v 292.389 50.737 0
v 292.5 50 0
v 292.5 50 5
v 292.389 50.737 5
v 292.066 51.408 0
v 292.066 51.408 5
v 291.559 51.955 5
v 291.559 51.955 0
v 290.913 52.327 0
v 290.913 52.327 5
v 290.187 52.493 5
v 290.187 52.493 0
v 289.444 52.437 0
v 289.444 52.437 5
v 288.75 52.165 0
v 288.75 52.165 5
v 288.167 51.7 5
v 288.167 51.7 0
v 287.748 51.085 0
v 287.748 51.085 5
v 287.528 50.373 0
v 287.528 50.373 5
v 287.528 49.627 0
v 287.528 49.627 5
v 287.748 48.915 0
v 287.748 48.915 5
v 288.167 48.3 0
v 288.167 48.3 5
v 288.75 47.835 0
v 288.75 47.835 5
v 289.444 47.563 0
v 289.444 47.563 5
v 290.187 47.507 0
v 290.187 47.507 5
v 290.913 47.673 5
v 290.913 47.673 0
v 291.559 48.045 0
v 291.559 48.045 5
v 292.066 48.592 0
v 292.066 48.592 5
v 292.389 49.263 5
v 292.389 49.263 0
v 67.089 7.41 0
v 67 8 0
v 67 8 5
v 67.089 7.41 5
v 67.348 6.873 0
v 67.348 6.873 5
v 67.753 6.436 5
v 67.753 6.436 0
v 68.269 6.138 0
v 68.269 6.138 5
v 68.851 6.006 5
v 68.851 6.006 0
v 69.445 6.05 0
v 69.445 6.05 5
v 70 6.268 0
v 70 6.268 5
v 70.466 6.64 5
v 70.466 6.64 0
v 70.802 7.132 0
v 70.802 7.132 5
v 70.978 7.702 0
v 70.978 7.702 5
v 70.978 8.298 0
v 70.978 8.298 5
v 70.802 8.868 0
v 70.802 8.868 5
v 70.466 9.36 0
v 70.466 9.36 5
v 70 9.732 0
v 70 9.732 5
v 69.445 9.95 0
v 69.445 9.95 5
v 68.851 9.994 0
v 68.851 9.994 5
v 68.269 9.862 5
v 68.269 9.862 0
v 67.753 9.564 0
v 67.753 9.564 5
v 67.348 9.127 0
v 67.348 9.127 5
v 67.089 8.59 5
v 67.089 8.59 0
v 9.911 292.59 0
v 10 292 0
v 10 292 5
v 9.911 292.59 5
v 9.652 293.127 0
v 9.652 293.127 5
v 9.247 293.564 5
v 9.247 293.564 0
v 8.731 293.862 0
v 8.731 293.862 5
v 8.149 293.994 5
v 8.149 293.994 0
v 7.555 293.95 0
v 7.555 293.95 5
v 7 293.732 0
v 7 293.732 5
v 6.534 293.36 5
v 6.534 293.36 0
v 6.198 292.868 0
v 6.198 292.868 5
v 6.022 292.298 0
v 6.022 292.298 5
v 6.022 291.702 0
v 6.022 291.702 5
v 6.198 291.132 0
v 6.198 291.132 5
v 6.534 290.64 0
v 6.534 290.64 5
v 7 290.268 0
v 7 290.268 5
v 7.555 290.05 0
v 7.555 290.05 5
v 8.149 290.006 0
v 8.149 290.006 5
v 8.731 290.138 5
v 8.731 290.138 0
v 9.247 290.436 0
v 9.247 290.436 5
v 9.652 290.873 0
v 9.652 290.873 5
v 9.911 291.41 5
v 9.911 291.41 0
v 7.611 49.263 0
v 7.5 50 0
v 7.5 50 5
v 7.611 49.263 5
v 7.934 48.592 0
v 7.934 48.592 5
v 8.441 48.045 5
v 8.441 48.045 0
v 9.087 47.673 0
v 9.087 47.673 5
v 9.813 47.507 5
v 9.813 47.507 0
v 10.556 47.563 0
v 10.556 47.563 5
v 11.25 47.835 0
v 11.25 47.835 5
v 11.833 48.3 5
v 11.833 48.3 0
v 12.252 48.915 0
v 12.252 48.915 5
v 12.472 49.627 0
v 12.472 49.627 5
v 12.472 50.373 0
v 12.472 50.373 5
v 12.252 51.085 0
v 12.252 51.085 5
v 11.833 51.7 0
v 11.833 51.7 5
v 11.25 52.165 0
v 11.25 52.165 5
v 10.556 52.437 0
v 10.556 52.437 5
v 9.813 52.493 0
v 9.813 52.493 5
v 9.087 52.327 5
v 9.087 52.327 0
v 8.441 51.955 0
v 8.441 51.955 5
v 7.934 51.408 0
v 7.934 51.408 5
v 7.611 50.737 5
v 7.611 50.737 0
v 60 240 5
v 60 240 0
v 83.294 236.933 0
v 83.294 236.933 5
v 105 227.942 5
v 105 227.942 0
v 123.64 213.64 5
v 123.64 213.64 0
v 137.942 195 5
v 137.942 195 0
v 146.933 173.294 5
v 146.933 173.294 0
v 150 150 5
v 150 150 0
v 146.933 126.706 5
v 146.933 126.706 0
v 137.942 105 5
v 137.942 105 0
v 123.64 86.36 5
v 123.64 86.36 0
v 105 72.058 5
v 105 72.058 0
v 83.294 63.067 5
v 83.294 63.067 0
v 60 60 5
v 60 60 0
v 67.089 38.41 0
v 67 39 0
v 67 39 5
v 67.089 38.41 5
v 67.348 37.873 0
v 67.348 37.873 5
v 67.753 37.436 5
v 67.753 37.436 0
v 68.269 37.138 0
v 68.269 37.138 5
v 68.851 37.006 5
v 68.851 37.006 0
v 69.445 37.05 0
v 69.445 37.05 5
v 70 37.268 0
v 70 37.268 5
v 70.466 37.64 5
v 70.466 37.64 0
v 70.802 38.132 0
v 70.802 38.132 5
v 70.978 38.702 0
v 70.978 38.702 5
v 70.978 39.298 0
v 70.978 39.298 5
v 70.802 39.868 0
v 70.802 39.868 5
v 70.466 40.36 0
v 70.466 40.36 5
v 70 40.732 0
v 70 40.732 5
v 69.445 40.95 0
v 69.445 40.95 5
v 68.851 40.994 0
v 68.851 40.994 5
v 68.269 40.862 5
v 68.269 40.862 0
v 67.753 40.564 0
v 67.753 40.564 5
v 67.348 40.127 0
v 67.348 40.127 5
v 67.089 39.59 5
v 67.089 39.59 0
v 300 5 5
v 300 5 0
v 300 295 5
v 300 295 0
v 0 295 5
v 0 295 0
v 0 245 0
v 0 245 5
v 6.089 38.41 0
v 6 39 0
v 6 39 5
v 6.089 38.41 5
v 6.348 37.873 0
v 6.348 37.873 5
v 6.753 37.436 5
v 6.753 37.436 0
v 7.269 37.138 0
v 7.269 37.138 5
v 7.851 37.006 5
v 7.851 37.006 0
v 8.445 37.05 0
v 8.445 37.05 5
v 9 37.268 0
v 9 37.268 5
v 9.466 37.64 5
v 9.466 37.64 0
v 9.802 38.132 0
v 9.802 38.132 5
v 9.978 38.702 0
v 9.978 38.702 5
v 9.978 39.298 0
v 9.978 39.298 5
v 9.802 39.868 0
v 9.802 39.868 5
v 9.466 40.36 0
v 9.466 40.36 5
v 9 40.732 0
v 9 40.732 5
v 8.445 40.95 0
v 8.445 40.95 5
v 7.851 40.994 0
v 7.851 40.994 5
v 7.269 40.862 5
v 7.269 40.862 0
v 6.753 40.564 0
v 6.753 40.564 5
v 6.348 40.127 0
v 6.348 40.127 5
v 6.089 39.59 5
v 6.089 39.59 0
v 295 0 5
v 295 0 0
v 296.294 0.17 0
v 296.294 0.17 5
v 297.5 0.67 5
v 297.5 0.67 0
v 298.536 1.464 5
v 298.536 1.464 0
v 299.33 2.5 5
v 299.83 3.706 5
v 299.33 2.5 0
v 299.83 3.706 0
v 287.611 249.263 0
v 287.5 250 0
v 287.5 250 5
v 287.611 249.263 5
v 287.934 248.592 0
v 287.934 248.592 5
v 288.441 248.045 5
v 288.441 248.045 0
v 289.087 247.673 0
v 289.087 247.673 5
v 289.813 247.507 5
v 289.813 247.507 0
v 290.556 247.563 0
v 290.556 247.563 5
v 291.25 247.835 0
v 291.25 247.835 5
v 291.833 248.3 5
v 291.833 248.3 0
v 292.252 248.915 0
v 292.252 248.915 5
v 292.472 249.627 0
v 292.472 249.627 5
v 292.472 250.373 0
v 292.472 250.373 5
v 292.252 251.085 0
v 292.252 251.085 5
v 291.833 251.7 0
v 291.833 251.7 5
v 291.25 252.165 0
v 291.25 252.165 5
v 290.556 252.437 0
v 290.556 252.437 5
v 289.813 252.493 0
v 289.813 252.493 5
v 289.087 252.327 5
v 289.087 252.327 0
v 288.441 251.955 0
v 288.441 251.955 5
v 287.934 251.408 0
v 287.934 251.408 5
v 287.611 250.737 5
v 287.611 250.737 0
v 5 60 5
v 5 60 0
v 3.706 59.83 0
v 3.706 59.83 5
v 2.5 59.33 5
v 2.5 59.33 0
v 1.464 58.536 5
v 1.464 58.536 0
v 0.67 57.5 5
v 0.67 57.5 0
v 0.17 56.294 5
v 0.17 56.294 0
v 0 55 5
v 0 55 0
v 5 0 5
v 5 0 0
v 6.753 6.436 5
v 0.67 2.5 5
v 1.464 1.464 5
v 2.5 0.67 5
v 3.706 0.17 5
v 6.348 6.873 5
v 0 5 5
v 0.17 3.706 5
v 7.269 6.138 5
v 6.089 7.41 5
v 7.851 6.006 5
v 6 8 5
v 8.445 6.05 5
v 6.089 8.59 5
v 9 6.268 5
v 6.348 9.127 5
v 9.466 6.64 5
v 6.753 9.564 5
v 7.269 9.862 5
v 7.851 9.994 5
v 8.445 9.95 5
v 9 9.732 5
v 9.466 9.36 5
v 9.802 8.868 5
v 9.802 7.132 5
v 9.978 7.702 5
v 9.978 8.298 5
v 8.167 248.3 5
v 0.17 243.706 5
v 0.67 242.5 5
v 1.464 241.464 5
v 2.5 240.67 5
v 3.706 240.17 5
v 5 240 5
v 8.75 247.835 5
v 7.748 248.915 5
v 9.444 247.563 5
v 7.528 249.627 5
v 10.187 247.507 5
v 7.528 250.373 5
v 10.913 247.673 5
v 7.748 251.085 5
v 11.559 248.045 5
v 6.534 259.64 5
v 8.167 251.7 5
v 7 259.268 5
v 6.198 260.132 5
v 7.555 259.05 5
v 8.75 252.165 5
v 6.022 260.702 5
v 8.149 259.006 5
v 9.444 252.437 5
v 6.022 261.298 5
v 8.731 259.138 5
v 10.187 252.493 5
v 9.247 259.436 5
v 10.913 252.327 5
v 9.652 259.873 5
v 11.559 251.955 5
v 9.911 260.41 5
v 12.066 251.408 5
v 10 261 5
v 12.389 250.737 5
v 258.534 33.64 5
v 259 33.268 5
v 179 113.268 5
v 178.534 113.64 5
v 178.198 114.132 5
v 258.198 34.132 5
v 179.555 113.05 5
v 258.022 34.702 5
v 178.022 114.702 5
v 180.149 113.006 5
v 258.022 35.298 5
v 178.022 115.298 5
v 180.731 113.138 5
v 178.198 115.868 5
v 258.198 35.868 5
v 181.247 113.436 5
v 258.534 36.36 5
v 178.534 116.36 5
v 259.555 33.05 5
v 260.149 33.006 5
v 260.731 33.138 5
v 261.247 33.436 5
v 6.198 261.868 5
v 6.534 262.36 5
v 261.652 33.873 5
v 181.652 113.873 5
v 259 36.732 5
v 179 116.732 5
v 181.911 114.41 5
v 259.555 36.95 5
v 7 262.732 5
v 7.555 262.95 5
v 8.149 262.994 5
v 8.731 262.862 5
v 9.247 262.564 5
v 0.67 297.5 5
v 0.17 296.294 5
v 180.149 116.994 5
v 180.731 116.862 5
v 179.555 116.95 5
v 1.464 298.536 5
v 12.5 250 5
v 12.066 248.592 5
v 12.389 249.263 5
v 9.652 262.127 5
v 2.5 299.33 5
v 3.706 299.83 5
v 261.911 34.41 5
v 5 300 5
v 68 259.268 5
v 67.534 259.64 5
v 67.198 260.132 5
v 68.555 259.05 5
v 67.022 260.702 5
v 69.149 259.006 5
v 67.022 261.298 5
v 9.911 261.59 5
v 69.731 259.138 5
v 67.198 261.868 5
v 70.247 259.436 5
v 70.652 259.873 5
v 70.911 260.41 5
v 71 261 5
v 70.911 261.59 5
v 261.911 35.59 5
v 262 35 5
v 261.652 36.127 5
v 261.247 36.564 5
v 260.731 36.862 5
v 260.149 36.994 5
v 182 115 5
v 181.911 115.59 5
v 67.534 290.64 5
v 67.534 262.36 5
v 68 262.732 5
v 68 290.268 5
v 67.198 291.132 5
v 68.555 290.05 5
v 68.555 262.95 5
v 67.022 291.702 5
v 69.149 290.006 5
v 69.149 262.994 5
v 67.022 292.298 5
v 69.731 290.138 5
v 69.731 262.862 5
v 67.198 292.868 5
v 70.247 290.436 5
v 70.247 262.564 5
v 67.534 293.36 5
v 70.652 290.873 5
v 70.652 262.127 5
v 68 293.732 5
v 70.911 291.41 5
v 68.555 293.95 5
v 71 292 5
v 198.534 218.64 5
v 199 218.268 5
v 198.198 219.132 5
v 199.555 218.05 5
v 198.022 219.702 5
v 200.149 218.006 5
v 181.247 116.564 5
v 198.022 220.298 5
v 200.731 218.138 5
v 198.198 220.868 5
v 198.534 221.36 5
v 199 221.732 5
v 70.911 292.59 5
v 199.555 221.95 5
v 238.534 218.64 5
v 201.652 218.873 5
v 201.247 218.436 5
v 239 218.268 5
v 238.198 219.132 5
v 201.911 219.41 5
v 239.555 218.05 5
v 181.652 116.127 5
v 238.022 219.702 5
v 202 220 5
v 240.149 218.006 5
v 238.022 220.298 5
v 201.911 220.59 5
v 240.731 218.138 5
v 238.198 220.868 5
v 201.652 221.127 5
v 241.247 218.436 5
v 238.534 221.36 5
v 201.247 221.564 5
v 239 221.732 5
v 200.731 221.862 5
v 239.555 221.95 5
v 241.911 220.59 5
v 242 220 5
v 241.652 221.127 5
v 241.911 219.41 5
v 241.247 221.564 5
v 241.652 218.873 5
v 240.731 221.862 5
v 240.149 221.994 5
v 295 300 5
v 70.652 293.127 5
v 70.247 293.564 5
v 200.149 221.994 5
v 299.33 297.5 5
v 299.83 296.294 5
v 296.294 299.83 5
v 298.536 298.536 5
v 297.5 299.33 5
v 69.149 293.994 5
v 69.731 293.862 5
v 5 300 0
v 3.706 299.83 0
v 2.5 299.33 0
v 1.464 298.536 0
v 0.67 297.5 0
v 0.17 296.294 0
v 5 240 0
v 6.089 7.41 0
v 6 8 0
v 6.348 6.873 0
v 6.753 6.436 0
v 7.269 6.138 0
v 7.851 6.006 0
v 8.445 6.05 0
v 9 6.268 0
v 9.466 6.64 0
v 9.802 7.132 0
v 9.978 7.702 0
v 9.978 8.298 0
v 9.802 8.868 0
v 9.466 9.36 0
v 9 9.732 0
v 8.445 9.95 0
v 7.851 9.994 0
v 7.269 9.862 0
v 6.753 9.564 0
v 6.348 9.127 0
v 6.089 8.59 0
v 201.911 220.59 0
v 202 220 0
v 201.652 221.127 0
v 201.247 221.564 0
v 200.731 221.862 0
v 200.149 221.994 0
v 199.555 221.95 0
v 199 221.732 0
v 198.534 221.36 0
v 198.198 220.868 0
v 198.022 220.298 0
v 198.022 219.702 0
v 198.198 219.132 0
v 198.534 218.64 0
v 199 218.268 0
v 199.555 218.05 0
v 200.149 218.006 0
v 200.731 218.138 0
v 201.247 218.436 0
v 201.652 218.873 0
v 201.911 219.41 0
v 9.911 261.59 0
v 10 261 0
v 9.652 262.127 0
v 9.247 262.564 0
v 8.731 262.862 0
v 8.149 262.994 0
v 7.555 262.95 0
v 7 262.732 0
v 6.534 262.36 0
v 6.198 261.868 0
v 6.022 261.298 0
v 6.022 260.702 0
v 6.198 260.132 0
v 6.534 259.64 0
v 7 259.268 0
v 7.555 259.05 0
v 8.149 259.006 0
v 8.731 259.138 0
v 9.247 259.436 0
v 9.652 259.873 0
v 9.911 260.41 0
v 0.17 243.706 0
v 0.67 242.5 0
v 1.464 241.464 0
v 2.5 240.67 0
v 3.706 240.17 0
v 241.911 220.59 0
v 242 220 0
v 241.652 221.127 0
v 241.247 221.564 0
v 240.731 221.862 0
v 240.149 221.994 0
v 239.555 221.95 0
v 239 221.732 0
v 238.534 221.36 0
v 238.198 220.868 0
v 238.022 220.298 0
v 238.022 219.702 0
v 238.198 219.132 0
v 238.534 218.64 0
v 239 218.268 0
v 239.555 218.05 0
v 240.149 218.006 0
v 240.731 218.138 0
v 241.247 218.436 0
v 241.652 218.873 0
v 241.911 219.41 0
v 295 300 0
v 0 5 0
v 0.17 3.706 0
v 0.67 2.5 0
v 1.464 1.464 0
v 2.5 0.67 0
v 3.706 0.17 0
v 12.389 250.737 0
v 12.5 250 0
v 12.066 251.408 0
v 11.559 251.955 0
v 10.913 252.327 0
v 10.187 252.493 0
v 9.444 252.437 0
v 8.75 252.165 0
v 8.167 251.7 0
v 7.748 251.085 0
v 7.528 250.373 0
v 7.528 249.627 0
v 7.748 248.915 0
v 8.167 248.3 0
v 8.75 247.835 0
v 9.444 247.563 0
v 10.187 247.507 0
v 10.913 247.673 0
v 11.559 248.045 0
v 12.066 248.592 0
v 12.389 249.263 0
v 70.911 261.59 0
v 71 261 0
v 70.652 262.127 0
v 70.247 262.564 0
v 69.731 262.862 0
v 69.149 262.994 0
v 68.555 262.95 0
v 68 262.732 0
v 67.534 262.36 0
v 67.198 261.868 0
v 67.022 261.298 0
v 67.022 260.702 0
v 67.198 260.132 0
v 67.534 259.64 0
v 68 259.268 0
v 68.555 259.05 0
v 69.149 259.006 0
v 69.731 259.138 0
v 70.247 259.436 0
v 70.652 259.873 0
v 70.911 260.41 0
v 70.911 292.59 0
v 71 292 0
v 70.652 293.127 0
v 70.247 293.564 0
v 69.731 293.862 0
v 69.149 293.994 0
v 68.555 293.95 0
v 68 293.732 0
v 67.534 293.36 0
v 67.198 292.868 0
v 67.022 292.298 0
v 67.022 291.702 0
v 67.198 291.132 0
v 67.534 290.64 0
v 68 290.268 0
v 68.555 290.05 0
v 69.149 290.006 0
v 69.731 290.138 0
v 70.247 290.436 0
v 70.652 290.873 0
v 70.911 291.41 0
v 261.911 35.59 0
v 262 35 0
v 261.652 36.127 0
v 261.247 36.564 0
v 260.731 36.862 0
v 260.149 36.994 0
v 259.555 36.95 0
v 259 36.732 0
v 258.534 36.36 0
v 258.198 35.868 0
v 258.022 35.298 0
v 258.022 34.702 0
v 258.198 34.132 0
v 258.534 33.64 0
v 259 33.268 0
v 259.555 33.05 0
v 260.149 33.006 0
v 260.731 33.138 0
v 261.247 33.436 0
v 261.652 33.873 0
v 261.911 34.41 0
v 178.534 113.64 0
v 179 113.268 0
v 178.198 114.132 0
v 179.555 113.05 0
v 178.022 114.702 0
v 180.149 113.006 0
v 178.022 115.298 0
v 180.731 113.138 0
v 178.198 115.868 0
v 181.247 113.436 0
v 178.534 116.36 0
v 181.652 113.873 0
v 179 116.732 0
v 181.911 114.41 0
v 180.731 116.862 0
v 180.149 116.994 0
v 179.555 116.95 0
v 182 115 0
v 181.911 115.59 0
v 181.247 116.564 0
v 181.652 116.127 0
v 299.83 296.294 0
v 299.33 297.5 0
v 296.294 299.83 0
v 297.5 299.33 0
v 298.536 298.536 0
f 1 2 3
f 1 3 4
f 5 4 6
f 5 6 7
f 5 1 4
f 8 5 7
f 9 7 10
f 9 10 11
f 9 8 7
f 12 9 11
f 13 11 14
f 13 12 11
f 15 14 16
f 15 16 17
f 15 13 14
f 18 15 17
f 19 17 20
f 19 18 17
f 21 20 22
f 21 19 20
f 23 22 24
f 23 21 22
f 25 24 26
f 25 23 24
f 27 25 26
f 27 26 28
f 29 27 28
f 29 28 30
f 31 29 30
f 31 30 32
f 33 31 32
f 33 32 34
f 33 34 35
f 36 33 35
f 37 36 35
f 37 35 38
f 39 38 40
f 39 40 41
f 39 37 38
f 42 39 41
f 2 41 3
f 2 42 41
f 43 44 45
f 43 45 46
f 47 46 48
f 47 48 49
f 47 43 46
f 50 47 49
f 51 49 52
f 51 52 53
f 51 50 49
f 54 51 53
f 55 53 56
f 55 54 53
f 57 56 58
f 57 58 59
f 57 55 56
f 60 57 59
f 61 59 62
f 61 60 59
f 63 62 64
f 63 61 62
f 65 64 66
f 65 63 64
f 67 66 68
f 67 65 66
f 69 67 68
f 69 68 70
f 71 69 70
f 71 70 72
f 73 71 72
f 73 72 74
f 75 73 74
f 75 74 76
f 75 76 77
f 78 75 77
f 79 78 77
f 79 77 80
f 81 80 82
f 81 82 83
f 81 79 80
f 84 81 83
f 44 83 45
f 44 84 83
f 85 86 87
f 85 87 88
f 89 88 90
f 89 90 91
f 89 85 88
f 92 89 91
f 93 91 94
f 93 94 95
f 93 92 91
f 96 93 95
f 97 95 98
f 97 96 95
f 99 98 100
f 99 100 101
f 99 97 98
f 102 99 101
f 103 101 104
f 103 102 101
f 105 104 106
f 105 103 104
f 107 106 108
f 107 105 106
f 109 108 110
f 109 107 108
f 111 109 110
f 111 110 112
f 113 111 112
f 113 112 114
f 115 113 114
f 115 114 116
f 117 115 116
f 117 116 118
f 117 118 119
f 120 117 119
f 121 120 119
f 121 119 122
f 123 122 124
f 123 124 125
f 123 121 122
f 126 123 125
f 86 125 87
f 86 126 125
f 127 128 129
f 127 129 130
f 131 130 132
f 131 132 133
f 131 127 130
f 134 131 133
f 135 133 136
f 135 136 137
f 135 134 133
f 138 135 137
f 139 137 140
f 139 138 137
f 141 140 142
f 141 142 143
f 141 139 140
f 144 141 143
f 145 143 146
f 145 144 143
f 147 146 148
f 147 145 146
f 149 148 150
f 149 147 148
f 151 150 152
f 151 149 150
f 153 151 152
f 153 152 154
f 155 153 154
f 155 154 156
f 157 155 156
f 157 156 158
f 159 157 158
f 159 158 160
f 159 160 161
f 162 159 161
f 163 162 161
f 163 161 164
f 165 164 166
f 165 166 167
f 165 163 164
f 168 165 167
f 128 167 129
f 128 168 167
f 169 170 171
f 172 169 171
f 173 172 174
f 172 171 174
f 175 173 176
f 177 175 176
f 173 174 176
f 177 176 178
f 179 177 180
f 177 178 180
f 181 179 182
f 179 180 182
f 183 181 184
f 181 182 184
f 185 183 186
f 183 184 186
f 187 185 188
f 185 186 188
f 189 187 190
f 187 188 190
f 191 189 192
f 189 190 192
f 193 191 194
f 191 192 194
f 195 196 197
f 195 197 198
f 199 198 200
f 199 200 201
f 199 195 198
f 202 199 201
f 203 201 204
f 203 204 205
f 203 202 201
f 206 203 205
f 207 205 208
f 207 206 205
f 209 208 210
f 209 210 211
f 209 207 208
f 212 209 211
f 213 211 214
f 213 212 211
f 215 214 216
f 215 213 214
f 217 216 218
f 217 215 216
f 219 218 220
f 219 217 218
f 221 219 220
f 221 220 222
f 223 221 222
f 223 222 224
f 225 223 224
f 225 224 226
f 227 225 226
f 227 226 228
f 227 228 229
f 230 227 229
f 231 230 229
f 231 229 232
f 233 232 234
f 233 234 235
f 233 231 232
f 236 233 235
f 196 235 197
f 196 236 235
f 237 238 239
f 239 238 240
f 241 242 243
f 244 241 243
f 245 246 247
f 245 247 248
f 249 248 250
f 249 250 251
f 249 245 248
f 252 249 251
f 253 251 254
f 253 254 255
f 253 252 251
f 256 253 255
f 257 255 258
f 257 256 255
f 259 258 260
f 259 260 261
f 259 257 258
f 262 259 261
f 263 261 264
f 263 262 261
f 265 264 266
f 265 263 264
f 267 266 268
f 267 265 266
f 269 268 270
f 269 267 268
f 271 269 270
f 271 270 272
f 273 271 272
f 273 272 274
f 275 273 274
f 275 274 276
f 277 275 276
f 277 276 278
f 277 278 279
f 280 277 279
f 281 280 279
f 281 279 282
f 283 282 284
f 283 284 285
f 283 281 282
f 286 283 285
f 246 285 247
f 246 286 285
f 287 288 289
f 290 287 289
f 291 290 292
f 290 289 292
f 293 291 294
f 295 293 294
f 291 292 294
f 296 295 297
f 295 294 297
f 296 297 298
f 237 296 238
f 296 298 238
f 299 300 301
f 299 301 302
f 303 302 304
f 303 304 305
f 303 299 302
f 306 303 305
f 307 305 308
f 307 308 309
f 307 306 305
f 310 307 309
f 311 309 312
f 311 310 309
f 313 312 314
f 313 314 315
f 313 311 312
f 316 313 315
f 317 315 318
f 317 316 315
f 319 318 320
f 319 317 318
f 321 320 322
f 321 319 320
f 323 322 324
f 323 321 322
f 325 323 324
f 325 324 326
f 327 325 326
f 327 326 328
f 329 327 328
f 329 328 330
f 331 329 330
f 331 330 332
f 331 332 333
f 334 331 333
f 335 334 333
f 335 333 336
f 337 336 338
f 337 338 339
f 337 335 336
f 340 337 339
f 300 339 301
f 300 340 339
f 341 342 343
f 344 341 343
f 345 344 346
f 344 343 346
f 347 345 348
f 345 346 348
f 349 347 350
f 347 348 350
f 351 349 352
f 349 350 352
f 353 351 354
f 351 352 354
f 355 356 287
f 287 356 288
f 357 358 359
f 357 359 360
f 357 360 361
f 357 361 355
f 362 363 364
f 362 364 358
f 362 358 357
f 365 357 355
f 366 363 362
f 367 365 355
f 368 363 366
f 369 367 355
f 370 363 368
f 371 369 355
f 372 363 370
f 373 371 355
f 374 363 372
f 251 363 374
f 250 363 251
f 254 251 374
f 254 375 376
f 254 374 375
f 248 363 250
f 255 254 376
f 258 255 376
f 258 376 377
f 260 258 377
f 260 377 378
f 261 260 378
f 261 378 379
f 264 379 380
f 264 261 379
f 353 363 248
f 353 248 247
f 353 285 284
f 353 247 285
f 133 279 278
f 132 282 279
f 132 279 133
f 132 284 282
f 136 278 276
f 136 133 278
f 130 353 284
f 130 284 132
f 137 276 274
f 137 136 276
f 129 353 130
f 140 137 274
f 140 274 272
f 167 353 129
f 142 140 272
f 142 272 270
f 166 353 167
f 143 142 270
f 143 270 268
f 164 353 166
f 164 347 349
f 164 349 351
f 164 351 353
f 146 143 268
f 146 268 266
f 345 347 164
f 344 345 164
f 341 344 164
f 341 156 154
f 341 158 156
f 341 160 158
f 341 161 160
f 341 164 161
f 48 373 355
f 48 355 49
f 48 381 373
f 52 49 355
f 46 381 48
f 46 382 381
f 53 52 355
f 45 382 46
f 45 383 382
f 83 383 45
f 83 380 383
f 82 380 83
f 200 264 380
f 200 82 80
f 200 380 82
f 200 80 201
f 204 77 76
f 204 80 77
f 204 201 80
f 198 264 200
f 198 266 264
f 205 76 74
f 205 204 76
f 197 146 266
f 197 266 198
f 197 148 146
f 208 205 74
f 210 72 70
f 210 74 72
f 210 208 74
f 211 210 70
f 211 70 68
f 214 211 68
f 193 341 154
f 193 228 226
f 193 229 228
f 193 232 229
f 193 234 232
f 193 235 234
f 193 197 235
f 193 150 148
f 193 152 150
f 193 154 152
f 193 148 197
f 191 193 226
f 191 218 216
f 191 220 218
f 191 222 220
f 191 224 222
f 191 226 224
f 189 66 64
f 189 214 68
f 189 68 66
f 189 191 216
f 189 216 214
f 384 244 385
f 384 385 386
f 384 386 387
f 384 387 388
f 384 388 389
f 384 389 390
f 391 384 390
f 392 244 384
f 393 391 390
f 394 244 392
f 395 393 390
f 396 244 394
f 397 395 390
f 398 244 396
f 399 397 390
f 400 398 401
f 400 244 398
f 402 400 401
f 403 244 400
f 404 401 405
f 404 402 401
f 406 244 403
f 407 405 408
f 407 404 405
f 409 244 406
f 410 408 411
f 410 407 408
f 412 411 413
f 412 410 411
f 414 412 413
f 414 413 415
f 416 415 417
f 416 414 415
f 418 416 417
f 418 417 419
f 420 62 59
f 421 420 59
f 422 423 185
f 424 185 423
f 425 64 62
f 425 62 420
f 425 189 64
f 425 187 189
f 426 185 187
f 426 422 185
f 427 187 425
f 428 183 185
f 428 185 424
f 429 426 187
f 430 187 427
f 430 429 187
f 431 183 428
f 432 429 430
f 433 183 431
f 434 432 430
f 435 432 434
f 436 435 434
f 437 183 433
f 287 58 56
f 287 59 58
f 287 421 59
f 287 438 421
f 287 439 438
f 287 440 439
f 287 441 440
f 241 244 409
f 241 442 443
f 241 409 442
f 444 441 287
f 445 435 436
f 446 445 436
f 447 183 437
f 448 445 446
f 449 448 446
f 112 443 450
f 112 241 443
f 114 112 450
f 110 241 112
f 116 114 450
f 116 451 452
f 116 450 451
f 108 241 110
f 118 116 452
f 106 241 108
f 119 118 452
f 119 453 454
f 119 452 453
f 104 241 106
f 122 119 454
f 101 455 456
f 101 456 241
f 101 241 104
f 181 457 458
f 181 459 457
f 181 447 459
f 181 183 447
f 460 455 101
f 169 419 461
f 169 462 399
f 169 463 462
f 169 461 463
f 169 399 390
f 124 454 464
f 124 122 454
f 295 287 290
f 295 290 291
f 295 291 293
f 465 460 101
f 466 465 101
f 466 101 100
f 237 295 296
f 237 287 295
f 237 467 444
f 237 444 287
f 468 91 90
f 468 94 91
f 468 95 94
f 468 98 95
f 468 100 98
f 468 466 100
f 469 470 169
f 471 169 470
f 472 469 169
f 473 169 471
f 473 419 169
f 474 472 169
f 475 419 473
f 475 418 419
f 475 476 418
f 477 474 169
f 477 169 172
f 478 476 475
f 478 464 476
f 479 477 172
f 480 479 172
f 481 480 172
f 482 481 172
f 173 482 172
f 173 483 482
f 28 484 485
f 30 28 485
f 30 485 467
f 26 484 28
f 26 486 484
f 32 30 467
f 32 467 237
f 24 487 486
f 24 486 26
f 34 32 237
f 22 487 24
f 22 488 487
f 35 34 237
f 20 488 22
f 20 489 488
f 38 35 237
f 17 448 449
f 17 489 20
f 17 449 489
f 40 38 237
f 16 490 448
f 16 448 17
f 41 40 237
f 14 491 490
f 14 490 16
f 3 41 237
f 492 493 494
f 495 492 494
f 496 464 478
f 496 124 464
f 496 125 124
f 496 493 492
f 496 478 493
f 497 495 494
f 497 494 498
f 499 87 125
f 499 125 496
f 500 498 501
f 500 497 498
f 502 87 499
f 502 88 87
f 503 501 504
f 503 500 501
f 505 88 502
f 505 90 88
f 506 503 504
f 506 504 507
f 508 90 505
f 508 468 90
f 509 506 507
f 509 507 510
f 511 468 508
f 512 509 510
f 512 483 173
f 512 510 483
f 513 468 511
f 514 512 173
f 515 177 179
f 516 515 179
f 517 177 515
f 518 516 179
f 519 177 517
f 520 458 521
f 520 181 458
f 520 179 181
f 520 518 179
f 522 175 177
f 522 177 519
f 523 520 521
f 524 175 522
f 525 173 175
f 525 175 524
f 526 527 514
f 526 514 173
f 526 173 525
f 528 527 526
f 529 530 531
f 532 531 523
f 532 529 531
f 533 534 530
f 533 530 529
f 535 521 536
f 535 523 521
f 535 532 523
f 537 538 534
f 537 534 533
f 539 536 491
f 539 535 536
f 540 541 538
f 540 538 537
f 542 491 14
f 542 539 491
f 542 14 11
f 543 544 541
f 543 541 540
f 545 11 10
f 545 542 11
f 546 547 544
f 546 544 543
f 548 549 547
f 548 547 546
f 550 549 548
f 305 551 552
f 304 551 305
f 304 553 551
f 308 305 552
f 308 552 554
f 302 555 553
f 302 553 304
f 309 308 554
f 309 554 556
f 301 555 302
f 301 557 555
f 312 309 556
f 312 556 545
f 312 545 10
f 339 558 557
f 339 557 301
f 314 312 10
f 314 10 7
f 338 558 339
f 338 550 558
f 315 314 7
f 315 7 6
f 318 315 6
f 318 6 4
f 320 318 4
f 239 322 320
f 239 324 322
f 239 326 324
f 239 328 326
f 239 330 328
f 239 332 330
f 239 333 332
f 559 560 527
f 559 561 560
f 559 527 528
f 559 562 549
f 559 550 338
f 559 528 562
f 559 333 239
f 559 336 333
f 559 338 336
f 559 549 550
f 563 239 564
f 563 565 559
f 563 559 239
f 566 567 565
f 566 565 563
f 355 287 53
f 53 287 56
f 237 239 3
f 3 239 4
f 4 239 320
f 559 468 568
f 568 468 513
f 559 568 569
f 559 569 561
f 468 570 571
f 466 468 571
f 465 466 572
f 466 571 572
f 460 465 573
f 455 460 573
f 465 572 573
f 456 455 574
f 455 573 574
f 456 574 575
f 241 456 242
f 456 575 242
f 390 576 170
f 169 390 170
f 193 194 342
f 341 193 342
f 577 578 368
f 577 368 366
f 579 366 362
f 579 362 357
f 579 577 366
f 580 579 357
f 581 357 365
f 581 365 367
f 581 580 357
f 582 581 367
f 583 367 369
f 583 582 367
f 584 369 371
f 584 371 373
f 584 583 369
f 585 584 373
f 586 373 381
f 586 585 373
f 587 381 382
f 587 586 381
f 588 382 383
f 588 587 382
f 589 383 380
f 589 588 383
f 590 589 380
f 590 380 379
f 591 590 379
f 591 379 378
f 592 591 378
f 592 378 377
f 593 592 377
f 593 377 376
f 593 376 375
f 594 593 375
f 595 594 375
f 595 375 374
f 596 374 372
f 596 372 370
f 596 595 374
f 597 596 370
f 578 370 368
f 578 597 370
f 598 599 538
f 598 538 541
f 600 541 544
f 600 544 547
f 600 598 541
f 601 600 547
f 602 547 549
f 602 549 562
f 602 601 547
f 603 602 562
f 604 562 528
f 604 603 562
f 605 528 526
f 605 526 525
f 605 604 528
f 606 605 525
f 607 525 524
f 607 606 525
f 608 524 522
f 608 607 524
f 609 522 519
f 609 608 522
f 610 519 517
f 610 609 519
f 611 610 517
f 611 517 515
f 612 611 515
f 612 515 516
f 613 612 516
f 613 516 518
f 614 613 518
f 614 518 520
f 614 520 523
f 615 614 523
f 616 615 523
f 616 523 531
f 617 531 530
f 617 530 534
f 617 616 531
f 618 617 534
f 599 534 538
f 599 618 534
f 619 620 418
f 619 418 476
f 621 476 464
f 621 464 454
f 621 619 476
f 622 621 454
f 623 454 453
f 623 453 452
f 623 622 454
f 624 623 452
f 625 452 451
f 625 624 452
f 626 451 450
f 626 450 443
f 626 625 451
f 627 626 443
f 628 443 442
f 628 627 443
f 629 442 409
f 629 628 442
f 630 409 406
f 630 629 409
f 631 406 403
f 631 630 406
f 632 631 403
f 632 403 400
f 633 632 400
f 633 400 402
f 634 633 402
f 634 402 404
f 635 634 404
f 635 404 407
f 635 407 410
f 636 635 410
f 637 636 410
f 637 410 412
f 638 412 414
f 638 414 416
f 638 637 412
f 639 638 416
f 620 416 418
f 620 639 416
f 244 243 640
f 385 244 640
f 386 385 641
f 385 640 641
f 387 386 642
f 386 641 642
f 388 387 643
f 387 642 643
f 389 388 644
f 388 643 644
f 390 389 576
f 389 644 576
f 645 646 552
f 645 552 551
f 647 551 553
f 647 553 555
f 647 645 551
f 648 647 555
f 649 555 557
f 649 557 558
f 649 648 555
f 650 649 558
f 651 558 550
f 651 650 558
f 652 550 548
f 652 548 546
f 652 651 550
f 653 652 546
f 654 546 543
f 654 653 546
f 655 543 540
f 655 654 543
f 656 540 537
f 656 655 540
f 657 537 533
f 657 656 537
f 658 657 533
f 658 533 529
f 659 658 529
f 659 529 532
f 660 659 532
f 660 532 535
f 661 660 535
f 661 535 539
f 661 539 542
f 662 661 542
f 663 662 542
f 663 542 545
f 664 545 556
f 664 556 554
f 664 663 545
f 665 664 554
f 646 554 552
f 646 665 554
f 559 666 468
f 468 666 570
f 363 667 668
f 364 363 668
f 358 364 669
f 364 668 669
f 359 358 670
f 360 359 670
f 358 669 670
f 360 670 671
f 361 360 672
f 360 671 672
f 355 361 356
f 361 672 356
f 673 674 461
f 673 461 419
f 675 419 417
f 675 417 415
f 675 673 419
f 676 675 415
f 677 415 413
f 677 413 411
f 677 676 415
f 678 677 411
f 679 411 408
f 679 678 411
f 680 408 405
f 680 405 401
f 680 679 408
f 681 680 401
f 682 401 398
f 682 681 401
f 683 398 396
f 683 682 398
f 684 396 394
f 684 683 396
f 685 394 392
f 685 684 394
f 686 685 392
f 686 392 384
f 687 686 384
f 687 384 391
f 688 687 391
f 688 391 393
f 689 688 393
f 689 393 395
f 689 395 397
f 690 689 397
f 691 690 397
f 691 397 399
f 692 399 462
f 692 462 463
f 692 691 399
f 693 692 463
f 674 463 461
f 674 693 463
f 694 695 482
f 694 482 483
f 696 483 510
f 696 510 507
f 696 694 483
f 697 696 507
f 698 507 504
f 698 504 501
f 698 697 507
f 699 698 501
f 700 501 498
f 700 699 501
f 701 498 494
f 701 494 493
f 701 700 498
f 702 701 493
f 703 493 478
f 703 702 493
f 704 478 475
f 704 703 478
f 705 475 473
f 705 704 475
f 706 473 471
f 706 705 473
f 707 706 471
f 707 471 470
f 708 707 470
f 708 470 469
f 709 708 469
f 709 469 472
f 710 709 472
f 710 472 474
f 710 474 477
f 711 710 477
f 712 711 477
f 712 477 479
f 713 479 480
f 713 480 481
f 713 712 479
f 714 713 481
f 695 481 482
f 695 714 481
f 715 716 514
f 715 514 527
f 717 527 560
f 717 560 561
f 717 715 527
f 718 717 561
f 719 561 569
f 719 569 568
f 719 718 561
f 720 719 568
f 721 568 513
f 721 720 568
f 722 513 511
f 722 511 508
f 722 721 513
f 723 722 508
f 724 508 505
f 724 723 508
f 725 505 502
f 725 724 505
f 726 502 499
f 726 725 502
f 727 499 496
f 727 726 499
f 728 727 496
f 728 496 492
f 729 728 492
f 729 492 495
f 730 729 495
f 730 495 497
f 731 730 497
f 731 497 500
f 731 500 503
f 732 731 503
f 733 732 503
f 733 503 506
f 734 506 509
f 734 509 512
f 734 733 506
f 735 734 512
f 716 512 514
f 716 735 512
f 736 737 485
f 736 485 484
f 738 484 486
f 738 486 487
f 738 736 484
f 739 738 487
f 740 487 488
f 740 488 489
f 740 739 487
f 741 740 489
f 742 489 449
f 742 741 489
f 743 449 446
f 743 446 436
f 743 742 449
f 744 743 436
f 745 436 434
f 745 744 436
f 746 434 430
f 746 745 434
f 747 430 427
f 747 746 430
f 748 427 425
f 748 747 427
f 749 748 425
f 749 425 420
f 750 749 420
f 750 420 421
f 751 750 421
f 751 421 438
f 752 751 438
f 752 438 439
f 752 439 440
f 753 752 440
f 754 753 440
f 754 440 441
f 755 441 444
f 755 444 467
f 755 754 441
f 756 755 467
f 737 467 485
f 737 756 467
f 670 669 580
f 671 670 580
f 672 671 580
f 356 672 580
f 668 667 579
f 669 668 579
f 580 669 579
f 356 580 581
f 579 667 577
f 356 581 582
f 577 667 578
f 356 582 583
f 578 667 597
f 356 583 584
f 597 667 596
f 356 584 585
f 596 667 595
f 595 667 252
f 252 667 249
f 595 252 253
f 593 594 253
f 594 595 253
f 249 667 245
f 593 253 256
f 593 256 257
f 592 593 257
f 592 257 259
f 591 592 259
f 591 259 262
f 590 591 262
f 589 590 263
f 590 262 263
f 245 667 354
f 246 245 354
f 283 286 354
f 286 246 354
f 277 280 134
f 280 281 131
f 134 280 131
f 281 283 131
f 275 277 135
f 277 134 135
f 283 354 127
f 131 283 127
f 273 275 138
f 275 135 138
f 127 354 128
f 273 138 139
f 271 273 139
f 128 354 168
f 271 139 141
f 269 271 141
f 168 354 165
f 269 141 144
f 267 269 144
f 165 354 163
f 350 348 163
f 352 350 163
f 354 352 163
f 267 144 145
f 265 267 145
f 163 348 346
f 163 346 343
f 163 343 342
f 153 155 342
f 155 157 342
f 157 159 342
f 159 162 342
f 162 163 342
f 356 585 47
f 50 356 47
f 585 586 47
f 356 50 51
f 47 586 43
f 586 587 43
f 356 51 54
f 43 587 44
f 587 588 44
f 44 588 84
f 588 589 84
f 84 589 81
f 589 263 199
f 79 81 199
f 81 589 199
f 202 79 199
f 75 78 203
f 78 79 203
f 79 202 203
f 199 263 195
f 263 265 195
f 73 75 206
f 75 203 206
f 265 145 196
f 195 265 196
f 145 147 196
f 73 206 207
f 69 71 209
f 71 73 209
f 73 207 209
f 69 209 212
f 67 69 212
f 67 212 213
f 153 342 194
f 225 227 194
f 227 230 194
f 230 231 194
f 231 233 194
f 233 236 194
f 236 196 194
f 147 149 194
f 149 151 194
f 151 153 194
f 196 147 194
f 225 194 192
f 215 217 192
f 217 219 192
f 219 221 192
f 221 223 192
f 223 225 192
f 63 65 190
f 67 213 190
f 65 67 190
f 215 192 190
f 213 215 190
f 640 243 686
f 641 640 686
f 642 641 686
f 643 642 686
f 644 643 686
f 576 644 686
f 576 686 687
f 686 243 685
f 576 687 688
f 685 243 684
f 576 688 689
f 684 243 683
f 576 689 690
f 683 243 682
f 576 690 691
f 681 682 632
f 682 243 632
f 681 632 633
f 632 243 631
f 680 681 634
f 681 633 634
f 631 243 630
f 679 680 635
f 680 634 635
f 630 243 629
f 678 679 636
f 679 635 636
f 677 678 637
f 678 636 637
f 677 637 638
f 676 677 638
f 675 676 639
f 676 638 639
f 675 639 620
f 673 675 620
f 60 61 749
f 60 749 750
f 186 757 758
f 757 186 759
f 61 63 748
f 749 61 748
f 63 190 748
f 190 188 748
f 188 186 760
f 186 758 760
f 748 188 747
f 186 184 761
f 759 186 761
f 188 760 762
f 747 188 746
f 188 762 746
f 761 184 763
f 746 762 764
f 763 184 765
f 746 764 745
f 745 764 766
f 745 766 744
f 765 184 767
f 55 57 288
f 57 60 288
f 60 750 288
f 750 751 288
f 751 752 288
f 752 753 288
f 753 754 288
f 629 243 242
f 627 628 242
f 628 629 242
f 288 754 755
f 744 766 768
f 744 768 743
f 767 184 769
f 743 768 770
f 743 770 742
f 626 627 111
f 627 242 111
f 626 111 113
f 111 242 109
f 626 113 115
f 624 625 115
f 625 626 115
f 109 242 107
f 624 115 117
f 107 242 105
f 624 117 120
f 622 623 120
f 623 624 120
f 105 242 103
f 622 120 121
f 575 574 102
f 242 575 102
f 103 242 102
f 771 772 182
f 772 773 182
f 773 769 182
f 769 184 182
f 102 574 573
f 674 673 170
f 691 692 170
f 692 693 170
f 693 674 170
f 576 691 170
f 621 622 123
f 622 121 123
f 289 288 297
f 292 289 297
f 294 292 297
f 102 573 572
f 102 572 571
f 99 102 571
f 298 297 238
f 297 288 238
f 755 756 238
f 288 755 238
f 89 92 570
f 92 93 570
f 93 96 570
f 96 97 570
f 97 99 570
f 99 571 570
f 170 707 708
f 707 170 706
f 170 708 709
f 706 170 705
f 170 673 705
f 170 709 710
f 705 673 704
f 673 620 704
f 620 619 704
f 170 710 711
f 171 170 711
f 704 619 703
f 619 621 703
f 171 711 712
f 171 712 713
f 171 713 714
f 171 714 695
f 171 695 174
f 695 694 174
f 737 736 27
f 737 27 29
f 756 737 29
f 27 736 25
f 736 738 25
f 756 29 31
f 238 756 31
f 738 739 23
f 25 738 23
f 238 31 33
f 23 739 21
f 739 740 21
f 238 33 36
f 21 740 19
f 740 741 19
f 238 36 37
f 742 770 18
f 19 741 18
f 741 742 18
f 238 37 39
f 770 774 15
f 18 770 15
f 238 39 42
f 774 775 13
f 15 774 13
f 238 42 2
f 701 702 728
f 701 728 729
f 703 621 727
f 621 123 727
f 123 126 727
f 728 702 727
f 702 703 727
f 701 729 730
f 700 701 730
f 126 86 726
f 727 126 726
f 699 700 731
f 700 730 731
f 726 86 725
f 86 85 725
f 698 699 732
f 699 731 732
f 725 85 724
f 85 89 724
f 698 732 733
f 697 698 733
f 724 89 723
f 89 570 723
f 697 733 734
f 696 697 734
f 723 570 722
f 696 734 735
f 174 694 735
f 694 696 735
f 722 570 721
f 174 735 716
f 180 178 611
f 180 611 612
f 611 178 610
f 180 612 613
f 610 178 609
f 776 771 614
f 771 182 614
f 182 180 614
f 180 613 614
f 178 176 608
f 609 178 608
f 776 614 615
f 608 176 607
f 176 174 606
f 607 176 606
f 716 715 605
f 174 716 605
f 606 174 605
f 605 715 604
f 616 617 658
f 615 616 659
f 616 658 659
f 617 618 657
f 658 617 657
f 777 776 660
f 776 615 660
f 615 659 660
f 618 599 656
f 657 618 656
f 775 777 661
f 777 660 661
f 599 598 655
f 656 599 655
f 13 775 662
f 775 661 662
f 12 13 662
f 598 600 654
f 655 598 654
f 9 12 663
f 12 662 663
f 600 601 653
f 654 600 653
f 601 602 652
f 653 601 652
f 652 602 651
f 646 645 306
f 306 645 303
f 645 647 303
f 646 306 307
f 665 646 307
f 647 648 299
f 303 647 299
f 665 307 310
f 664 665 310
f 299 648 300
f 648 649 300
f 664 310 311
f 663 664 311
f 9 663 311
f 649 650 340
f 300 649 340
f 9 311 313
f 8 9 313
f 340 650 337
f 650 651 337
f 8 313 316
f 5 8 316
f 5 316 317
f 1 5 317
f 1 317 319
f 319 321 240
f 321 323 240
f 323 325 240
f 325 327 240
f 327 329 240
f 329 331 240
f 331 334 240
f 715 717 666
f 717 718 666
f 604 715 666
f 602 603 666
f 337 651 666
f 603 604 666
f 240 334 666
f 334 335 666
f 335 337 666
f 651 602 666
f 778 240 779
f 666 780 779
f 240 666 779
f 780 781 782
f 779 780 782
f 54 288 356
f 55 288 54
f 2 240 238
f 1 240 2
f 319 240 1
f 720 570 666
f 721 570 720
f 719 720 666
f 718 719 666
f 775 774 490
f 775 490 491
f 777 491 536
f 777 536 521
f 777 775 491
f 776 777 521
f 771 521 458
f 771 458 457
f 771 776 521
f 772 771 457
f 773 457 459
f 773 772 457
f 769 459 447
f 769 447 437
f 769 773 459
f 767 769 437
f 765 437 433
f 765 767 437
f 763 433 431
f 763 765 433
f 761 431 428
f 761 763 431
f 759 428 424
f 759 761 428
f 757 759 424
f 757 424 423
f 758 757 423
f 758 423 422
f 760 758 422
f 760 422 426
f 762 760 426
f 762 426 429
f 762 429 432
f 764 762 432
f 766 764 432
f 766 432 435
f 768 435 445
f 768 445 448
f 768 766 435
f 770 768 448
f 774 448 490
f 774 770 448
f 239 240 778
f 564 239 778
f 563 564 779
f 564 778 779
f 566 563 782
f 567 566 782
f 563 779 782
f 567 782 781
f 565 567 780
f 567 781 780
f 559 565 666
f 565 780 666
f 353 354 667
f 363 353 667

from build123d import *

# Parameters (mm, degrees)
SKETCH_1_R      = 2.5
SKETCH_1_R_2    = 2
EXTRUDE_1_DEPTH = 5


with BuildPart() as part:
    # 草图1 → 凸台-拉伸1 (new body)
    with BuildSketch(Plane.XY):
        with BuildLine():
            Line((5, 0), (295, 0))
            ThreePointArc((295, 0), (298.535533906, 1.464466094), (300, 5))
            Line((300, 5), (300, 295))
            ThreePointArc((300, 295), (298.535533906, 298.535533906), (295, 300))
            Line((295, 300), (5, 300))
            ThreePointArc((5, 300), (1.464466094, 298.535533906), (0, 295))
            Line((0, 295), (0, 245))
            ThreePointArc((0, 245), (1.464466094, 241.464466094), (5, 240))
            Line((5, 240), (60, 240))
            ThreePointArc((60, 240), (150, 150), (60, 60))
            Line((60, 60), (5, 60))
            ThreePointArc((5, 60), (1.464466094, 58.535533906), (0, 55))
            Line((0, 55), (0, 5))
            ThreePointArc((0, 5), (1.464466094, 1.464466094), (5, 0))
        make_face()
        with Locations((10, 250)):
            Circle(SKETCH_1_R, mode=Mode.SUBTRACT)
        with Locations(Location((290, 250, 0), (0, 0, 180))):
            Circle(SKETCH_1_R, mode=Mode.SUBTRACT)
        with Locations(Location((10, 50, 0), (0, 0, 180))):
            Circle(SKETCH_1_R, mode=Mode.SUBTRACT)
        with Locations((290, 50)):
            Circle(SKETCH_1_R, mode=Mode.SUBTRACT)
        with Locations((8, 292)):
            Circle(SKETCH_1_R_2, mode=Mode.SUBTRACT)
        with Locations((69, 292)):
            Circle(SKETCH_1_R_2, mode=Mode.SUBTRACT)
        with Locations((69, 261)):
            Circle(SKETCH_1_R_2, mode=Mode.SUBTRACT)
        with Locations((8, 261)):
            Circle(SKETCH_1_R_2, mode=Mode.SUBTRACT)
        with Locations(Location((8, 39, 0), (0, 0, 180))):
            Circle(SKETCH_1_R_2, mode=Mode.SUBTRACT)
        with Locations(Location((69, 39, 0), (0, 0, 180))):
            Circle(SKETCH_1_R_2, mode=Mode.SUBTRACT)
        with Locations(Location((69, 8, 0), (0, 0, 180))):
            Circle(SKETCH_1_R_2, mode=Mode.SUBTRACT)
        with Locations(Location((8, 8, 0), (0, 0, 180))):
            Circle(SKETCH_1_R_2, mode=Mode.SUBTRACT)
        with Locations((200, 220)):
            Circle(SKETCH_1_R_2, mode=Mode.SUBTRACT)
        with Locations((240, 220)):
            Circle(SKETCH_1_R_2, mode=Mode.SUBTRACT)
        with Locations((180, 115)):
            Circle(SKETCH_1_R_2, mode=Mode.SUBTRACT)
        with Locations((260, 35)):
            Circle(SKETCH_1_R_2, mode=Mode.SUBTRACT)
    extrude(amount=EXTRUDE_1_DEPTH)


solid = part.part
